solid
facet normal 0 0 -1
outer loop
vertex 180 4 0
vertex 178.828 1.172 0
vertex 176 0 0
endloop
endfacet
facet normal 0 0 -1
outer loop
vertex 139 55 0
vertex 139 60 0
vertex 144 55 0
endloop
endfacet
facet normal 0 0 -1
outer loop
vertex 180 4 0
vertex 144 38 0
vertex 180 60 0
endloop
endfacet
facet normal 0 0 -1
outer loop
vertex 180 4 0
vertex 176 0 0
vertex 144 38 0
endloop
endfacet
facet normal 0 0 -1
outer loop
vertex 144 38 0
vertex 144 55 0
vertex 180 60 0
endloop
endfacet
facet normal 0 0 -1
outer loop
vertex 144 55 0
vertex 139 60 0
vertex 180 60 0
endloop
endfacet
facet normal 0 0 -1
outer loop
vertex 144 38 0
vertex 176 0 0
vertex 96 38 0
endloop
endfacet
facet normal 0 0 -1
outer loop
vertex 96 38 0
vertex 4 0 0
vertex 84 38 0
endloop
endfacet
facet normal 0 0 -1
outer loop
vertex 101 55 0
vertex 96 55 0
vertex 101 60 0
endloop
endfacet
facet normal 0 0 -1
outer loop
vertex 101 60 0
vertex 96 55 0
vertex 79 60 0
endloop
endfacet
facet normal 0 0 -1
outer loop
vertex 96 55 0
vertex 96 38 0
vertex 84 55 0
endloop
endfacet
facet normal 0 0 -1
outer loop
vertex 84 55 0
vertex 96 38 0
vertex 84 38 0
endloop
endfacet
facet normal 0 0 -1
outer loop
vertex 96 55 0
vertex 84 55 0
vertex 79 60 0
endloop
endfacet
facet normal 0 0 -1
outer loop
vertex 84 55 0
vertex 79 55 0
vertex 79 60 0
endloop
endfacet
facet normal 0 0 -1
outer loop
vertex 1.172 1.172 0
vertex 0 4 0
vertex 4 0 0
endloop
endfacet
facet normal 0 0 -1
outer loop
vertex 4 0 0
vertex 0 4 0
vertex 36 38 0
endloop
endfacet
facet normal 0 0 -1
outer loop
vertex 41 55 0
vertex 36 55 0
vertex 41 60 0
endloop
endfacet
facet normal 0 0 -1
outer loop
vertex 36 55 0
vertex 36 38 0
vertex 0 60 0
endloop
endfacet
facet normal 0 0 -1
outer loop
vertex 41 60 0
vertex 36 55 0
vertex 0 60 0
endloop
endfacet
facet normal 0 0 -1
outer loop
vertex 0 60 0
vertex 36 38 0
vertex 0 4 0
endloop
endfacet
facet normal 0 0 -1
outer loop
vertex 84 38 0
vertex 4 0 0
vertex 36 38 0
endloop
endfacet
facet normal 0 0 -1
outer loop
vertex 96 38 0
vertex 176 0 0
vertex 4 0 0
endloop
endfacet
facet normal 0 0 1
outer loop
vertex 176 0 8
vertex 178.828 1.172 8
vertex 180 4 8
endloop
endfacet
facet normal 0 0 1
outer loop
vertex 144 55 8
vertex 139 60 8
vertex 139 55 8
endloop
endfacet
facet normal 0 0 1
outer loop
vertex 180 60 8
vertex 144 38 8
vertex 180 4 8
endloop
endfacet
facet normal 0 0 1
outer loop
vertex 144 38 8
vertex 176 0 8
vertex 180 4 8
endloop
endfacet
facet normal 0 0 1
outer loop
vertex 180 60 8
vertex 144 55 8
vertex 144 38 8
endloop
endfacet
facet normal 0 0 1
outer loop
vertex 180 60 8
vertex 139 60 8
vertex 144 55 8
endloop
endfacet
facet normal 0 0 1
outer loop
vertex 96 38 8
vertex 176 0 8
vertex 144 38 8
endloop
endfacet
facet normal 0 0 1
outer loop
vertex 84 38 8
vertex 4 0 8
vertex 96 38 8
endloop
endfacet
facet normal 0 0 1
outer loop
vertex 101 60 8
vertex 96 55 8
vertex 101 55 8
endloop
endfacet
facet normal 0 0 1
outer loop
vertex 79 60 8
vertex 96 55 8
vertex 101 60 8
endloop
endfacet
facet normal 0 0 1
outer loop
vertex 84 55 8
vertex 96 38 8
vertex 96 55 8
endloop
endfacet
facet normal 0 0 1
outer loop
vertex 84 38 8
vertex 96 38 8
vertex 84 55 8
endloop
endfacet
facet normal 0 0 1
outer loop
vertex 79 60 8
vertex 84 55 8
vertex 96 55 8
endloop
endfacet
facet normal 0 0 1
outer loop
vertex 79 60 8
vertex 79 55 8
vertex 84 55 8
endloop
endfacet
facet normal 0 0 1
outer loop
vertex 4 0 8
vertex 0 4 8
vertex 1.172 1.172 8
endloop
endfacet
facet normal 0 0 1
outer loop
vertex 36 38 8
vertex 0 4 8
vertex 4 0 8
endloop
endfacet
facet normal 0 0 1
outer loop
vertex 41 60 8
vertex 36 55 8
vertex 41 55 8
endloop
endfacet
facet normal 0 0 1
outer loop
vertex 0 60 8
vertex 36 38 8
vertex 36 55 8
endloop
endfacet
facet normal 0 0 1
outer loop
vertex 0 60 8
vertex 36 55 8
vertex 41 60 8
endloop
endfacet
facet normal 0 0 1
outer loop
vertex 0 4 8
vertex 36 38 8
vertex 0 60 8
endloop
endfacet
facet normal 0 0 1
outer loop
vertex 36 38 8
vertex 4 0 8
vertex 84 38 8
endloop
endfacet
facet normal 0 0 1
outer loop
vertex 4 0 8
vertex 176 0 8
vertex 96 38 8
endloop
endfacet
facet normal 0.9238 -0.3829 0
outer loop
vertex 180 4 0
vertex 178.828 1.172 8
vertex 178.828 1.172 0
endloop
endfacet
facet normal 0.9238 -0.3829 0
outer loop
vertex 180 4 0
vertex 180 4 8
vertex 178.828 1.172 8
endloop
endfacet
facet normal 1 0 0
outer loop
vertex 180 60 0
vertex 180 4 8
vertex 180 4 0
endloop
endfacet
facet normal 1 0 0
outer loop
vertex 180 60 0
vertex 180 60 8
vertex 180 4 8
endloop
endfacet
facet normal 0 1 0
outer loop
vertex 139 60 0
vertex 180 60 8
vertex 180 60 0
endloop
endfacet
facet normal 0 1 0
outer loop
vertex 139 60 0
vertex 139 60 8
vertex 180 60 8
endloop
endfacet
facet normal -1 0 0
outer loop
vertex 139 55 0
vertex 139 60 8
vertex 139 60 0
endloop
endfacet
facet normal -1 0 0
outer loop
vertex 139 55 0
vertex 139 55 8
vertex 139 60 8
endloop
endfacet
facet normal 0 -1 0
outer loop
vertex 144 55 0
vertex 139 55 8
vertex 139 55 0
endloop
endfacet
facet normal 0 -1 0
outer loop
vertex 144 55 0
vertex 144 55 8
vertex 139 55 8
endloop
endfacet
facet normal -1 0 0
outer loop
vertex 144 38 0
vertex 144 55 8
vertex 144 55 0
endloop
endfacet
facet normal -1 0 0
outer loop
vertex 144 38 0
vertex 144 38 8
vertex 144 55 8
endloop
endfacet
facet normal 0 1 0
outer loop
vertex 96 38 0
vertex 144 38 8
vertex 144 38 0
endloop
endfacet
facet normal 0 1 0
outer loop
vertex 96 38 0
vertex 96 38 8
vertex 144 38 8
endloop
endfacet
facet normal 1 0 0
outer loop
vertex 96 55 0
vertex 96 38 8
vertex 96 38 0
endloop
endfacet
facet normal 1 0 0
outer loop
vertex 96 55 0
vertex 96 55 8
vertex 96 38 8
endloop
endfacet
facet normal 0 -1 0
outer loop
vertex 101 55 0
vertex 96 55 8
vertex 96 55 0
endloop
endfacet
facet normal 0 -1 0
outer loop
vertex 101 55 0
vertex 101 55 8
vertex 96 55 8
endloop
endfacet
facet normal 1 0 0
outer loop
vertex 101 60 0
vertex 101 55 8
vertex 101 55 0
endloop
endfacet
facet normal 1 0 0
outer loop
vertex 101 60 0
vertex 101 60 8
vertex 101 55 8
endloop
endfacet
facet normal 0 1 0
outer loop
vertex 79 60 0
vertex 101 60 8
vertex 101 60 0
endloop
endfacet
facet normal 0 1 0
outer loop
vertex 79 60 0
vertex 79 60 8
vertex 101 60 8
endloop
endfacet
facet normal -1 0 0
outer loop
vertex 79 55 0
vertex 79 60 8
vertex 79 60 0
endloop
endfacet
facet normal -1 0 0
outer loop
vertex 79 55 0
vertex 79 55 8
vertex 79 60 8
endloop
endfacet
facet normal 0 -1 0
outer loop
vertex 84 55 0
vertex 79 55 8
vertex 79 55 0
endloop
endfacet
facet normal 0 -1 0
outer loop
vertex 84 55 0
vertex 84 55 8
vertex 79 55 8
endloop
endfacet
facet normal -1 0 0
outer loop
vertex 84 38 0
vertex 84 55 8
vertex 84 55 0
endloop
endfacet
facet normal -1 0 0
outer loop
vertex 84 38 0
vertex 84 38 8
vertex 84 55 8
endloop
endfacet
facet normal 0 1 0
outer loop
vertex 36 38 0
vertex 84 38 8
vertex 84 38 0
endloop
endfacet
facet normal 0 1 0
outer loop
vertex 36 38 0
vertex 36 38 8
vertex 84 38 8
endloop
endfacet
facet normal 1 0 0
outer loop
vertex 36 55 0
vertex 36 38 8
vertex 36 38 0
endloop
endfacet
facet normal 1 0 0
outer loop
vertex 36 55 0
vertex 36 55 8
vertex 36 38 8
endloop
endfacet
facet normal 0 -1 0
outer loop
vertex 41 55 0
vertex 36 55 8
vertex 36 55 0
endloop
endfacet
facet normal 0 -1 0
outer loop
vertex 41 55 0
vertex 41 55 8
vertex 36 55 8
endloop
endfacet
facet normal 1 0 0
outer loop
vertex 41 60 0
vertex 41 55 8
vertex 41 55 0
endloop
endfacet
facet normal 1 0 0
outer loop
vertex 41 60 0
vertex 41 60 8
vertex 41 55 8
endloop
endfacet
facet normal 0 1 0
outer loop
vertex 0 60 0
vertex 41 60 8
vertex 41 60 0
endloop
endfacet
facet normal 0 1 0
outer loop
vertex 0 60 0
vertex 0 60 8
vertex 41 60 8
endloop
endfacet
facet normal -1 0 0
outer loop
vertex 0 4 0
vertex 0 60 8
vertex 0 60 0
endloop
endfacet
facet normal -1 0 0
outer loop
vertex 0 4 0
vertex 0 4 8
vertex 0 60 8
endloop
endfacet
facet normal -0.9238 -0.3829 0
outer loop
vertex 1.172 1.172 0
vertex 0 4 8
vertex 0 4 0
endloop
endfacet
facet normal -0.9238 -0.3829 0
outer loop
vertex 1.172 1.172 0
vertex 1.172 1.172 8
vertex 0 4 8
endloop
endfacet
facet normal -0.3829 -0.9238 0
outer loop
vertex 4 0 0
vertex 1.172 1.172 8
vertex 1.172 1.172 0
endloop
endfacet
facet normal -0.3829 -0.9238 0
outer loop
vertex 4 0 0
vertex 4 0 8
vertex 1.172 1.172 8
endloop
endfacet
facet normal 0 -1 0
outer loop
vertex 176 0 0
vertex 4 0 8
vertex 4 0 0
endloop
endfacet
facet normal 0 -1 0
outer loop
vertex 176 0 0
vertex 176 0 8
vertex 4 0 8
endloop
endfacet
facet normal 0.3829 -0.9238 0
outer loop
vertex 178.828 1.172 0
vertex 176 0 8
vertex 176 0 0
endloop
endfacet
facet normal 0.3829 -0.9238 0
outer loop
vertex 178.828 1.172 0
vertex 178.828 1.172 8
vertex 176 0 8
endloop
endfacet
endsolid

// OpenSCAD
$fn = 32;

// ----------------------------------------------------------------------
// Oversize slot bar: 180 mm bar with 2 oversize windows
// ----------------------------------------------------------------------

// --- parameters (mm) ---
profile_height = 8;       // extrusion height
profile_points = 24;      // points of the closed outline

profile = [[0, 4], [1.172, 1.172], [4, 0], [176, 0], [178.828, 1.172], [180, 4], [180, 60], [139, 60], [139, 55], [144, 55], [144, 38], [96, 38], [96, 55], [101, 55], [101, 60], [79, 60], [79, 55], [84, 55], [84, 38], [36, 38], [36, 55], [41, 55], [41, 60], [0, 60]];  // single closed polygon, 24 points, counter clockwise

// --- the one profile operation ---
linear_extrude(height = profile_height) polygon(points = profile);
